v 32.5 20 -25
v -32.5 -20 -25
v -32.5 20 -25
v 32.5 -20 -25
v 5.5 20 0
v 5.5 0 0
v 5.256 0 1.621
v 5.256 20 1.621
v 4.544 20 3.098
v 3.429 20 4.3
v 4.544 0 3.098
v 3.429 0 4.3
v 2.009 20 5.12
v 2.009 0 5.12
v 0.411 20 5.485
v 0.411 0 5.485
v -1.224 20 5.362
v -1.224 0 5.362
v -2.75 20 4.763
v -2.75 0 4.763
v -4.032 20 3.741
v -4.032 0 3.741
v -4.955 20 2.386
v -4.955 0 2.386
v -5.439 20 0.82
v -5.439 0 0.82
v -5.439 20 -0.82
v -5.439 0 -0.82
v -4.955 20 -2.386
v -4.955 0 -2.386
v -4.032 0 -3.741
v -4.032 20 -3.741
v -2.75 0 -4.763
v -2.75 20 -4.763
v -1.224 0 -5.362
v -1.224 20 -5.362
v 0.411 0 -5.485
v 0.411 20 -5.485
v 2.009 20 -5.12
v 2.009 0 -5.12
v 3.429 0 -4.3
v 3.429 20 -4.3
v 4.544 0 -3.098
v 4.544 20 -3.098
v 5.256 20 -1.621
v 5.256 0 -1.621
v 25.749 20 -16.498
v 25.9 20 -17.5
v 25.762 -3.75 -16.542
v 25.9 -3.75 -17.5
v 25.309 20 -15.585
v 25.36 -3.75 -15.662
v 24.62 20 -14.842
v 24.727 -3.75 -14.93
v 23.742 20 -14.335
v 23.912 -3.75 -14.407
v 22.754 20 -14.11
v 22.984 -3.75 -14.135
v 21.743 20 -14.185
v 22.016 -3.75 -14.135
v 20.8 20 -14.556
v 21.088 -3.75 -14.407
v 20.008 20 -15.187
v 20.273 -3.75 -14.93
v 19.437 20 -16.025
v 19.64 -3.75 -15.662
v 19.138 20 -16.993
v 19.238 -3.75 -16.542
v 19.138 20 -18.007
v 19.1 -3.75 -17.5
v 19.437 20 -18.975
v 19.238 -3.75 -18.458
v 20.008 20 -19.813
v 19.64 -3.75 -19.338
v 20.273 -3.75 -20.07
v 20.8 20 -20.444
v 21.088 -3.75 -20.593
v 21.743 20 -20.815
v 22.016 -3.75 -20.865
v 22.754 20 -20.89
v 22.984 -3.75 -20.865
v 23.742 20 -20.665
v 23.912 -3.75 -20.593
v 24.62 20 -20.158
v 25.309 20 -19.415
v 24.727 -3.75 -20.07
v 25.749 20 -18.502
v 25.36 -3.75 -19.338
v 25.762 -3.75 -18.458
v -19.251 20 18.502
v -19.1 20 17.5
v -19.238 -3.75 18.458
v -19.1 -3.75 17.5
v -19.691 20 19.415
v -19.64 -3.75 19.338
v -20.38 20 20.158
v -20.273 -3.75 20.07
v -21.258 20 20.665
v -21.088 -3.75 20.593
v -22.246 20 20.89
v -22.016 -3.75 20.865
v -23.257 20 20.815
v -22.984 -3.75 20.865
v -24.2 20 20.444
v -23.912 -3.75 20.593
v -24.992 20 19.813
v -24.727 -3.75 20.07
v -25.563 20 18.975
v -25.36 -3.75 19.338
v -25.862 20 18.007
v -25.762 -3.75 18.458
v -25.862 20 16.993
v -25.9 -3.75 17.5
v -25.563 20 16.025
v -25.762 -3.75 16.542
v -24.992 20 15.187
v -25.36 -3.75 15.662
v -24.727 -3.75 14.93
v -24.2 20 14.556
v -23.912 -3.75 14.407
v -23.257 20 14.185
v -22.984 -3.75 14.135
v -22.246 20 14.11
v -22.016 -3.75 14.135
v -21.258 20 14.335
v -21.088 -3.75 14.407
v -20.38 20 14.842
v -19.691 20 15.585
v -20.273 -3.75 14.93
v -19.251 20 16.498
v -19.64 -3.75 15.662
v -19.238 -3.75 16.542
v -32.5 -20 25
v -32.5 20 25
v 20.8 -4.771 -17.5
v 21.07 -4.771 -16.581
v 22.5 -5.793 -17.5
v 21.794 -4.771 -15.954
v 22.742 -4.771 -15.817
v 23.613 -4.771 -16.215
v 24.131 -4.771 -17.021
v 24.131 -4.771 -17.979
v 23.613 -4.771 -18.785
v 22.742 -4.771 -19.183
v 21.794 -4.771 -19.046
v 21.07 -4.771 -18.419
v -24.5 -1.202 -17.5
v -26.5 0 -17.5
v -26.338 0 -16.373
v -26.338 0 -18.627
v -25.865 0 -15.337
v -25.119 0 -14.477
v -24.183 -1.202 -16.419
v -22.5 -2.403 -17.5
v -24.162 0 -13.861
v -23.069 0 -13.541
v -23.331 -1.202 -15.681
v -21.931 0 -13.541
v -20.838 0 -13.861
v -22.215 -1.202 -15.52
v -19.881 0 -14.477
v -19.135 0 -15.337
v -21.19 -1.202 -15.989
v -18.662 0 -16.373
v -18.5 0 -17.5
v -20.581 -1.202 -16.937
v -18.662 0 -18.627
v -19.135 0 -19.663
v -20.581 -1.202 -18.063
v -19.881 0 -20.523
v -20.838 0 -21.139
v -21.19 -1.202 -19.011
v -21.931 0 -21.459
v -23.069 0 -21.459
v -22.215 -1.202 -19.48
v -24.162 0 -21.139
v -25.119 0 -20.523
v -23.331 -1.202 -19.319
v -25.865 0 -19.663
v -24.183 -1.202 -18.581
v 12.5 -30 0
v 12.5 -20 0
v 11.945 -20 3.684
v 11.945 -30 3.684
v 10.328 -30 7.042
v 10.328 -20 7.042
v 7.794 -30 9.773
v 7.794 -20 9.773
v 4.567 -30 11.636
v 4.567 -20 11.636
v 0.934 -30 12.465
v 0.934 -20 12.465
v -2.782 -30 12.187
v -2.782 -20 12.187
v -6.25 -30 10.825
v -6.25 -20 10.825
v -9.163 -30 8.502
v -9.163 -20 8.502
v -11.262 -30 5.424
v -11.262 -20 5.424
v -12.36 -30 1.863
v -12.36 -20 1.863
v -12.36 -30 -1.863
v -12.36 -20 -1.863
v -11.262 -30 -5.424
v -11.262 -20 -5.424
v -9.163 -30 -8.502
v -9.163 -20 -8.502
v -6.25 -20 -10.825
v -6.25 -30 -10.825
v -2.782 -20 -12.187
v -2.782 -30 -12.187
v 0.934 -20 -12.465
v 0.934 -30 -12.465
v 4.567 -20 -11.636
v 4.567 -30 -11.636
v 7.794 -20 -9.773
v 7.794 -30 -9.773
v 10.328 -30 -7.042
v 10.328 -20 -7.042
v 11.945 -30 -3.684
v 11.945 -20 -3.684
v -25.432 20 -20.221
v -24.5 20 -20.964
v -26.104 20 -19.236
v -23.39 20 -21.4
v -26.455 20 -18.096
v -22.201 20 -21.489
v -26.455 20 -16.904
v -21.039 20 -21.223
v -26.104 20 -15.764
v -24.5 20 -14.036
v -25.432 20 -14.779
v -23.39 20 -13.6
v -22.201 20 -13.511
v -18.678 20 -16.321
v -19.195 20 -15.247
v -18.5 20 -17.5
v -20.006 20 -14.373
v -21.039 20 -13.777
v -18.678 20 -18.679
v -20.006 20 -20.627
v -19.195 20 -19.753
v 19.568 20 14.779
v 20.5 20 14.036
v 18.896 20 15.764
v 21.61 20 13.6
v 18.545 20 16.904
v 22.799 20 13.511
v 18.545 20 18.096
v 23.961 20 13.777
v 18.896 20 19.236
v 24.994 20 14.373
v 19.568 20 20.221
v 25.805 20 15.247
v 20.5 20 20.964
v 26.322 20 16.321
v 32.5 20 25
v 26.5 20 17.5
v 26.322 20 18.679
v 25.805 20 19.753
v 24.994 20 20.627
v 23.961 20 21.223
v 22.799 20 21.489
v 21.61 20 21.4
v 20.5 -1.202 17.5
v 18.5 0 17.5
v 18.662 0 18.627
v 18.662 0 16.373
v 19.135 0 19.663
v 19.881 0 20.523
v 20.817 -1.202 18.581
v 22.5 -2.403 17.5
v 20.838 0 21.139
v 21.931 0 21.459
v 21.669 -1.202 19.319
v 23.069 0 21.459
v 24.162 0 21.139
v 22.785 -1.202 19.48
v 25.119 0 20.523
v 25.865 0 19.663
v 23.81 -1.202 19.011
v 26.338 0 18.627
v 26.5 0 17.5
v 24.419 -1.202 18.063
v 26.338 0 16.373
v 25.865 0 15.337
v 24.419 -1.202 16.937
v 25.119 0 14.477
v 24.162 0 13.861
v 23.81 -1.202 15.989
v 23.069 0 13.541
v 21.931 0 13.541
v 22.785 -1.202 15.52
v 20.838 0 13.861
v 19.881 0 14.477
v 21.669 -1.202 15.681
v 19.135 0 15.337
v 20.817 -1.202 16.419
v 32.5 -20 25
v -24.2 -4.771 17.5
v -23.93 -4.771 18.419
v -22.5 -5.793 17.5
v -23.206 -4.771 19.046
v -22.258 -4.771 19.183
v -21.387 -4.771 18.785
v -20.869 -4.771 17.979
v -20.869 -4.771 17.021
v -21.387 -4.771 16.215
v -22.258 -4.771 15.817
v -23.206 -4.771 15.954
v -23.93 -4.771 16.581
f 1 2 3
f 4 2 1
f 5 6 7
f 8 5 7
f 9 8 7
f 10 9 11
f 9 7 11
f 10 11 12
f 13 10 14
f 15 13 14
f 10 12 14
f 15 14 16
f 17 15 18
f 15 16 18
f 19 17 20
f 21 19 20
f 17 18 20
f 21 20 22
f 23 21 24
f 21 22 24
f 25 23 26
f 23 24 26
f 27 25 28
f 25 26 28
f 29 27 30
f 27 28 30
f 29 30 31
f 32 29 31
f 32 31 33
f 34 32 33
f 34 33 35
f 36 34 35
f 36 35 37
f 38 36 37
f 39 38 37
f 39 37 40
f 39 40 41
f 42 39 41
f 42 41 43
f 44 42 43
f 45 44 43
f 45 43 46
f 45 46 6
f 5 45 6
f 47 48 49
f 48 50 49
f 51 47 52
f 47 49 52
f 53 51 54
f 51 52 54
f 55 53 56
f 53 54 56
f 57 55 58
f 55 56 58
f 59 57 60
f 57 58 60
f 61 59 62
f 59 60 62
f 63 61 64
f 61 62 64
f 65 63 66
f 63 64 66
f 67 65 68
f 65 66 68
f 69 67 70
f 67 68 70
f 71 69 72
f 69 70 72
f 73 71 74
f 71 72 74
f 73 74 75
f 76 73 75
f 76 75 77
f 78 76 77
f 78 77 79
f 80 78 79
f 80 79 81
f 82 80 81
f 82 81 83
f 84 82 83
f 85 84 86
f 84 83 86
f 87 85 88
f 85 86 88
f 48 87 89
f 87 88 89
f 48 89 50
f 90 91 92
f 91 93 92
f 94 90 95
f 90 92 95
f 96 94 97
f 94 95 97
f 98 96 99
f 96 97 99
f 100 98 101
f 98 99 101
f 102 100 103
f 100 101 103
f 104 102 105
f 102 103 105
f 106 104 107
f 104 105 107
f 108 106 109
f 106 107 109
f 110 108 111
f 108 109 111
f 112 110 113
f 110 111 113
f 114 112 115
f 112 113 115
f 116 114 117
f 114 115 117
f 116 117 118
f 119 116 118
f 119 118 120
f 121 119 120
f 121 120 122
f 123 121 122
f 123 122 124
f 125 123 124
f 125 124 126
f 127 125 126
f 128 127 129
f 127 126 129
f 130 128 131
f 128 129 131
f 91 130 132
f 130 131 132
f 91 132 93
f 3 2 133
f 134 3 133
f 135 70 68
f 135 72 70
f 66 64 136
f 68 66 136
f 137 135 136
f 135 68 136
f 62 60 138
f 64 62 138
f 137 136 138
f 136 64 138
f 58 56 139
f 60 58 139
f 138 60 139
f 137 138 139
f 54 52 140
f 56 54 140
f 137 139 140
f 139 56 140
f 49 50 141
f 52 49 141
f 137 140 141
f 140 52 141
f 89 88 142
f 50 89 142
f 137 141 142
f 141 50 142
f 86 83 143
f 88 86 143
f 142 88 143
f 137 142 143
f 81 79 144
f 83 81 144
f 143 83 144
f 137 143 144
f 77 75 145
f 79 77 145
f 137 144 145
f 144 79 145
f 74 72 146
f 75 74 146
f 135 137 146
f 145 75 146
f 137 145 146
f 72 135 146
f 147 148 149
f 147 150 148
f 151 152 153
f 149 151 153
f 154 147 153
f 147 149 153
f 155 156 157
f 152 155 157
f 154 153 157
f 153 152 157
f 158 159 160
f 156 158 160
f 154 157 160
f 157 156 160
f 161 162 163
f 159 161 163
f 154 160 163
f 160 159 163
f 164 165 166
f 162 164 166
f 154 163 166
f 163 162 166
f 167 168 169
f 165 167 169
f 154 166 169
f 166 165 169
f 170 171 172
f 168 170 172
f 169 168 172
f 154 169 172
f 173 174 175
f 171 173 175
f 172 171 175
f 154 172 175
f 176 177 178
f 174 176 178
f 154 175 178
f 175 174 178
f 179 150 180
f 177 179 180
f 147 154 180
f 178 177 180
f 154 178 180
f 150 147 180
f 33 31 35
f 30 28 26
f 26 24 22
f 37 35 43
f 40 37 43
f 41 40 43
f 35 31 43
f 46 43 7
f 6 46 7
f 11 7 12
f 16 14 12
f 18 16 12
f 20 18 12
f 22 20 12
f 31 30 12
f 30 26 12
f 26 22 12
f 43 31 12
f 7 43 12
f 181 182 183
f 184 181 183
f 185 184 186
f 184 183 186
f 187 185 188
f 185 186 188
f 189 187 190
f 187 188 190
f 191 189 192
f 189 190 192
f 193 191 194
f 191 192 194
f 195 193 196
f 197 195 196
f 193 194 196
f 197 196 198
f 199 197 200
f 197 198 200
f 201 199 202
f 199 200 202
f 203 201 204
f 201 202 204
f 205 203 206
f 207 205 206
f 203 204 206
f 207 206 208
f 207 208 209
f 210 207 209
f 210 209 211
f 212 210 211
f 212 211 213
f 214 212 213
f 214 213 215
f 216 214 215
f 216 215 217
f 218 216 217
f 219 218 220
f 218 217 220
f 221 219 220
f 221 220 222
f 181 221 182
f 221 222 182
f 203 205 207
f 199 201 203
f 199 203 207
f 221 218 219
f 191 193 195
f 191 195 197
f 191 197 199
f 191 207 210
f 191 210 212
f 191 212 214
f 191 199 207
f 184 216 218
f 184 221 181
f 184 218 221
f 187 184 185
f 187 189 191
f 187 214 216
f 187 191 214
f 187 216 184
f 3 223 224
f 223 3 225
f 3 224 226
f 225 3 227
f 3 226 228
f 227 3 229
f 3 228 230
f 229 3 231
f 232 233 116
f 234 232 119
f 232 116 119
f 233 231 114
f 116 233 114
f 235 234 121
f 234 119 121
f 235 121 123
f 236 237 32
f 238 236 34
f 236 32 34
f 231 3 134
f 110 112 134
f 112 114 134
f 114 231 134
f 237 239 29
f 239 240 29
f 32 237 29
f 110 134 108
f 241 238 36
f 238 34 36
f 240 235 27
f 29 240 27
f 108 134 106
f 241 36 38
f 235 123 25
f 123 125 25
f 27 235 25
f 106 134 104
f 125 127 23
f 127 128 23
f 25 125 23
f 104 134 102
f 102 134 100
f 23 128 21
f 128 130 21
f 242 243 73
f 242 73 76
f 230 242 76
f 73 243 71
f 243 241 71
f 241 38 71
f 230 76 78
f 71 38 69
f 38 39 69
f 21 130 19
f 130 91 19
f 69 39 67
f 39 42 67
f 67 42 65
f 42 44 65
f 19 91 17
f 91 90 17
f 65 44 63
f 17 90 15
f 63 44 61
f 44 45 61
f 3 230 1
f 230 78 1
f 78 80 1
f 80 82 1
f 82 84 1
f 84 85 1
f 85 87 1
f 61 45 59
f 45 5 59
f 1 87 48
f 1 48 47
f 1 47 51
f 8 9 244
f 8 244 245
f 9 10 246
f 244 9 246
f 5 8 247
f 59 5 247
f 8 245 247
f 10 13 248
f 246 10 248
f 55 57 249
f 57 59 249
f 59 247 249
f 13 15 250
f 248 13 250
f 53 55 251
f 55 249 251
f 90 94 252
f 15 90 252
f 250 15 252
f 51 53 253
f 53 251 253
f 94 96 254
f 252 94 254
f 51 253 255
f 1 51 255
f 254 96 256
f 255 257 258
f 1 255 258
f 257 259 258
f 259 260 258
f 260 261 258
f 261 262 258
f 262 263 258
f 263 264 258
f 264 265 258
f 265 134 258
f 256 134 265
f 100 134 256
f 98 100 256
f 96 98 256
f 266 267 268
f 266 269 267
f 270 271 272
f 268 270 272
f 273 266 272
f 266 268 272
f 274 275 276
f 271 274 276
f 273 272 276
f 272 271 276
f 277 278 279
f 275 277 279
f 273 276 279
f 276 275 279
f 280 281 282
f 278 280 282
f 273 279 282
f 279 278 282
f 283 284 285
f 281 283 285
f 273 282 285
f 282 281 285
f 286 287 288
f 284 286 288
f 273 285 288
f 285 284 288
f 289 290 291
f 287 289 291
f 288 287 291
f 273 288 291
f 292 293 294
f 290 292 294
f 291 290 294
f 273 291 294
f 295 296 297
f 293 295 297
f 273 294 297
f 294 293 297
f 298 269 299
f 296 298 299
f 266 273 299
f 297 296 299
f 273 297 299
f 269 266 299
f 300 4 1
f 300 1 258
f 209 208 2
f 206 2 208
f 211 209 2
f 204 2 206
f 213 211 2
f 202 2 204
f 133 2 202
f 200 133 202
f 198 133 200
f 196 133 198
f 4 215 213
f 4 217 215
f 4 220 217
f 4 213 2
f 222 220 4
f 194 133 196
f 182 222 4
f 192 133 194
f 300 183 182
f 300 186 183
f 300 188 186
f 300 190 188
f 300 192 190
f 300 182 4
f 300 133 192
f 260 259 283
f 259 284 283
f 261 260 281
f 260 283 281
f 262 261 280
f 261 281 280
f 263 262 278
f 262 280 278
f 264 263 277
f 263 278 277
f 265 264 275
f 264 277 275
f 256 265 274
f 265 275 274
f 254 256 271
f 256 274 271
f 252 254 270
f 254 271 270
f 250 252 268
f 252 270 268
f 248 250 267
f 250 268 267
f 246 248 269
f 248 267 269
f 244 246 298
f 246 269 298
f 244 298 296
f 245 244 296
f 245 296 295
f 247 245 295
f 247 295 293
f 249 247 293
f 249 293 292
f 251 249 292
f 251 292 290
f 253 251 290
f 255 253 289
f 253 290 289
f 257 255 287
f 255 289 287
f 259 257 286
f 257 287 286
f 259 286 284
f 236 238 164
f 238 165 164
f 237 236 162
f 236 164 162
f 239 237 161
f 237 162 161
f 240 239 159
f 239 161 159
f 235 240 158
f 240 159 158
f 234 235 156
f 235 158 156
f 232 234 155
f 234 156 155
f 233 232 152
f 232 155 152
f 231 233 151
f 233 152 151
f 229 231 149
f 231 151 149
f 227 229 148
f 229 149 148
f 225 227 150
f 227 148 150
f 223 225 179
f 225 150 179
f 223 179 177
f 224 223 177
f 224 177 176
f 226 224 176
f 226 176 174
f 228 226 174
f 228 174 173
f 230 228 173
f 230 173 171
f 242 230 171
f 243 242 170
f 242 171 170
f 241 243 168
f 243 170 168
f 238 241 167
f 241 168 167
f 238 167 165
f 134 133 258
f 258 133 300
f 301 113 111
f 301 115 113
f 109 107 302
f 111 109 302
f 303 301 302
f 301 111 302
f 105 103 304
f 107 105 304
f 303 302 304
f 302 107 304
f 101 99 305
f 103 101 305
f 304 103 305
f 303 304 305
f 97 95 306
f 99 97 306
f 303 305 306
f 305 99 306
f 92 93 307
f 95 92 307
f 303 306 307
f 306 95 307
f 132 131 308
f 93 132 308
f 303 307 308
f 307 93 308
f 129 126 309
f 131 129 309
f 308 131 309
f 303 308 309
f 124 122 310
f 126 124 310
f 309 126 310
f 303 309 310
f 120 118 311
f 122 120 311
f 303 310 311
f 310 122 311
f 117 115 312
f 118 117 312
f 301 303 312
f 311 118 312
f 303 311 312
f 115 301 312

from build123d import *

# Parameters (mm, degrees)
F0_W     = 65
F0_H     = 50
F1_DEPTH = 20
F2_R     = 12.5
F3_DEPTH = 10
F4_D     = 11
F4_DEPTH = 60
F4_TIP   = 3.3047334047
F6_D     = 6.8
F6_DEPTH = 23.75
F6_TIP   = 2.0429261047
F7_D     = 8
F7_DEPTH = 20
F7_TIP   = 2.4034424761


with BuildPart() as f1:
    # F0 (on Front) → F1 (new body, symmetric)
    with BuildSketch(Plane.XZ):
        Rectangle(F0_W, F0_H)
    extrude(amount=F1_DEPTH, both=True)

    # F2 (on face) → F3 (join)
    with BuildSketch(Plane.XZ.offset(20)):
        Circle(F2_R)
    extrude(amount=F3_DEPTH)

    # F4 (one way)
    with BuildSketch(Plane.XZ):
        with Locations((0, 0)):
            Circle(F4_D / 2)
    extrude(amount=-F4_DEPTH, mode=Mode.SUBTRACT)
    with Locations(Plane.XZ):
        with Locations((0, 0)):
            with Locations((0, 0, -(F4_DEPTH + F4_TIP / 2))):  # 118° drill point
                Cone(0, F4_D / 2, F4_TIP, mode=Mode.SUBTRACT)

    # F6
    with Locations(Plane(origin=(0, 20, 0), x_dir=(-1, 0, 0), z_dir=(0, 1, 0))):
        with Locations((-22.5, -17.5), (22.5, 17.5)):
            Hole(F6_D / 2, depth=F6_DEPTH)
            with Locations((0, 0, -(F6_DEPTH + F6_TIP / 2))):  # 118° drill point
                Cone(0, F6_D / 2, F6_TIP, mode=Mode.SUBTRACT)

    # F7
    with Locations(Plane(origin=(0, 20, 0), x_dir=(-1, 0, 0), z_dir=(0, 1, 0))):
        with Locations((-22.5, 17.5), (22.5, -17.5)):
            Hole(F7_D / 2, depth=F7_DEPTH)
            with Locations((0, 0, -(F7_DEPTH + F7_TIP / 2))):  # 118° drill point
                Cone(0, F7_D / 2, F7_TIP, mode=Mode.SUBTRACT)


solid = f1.part
